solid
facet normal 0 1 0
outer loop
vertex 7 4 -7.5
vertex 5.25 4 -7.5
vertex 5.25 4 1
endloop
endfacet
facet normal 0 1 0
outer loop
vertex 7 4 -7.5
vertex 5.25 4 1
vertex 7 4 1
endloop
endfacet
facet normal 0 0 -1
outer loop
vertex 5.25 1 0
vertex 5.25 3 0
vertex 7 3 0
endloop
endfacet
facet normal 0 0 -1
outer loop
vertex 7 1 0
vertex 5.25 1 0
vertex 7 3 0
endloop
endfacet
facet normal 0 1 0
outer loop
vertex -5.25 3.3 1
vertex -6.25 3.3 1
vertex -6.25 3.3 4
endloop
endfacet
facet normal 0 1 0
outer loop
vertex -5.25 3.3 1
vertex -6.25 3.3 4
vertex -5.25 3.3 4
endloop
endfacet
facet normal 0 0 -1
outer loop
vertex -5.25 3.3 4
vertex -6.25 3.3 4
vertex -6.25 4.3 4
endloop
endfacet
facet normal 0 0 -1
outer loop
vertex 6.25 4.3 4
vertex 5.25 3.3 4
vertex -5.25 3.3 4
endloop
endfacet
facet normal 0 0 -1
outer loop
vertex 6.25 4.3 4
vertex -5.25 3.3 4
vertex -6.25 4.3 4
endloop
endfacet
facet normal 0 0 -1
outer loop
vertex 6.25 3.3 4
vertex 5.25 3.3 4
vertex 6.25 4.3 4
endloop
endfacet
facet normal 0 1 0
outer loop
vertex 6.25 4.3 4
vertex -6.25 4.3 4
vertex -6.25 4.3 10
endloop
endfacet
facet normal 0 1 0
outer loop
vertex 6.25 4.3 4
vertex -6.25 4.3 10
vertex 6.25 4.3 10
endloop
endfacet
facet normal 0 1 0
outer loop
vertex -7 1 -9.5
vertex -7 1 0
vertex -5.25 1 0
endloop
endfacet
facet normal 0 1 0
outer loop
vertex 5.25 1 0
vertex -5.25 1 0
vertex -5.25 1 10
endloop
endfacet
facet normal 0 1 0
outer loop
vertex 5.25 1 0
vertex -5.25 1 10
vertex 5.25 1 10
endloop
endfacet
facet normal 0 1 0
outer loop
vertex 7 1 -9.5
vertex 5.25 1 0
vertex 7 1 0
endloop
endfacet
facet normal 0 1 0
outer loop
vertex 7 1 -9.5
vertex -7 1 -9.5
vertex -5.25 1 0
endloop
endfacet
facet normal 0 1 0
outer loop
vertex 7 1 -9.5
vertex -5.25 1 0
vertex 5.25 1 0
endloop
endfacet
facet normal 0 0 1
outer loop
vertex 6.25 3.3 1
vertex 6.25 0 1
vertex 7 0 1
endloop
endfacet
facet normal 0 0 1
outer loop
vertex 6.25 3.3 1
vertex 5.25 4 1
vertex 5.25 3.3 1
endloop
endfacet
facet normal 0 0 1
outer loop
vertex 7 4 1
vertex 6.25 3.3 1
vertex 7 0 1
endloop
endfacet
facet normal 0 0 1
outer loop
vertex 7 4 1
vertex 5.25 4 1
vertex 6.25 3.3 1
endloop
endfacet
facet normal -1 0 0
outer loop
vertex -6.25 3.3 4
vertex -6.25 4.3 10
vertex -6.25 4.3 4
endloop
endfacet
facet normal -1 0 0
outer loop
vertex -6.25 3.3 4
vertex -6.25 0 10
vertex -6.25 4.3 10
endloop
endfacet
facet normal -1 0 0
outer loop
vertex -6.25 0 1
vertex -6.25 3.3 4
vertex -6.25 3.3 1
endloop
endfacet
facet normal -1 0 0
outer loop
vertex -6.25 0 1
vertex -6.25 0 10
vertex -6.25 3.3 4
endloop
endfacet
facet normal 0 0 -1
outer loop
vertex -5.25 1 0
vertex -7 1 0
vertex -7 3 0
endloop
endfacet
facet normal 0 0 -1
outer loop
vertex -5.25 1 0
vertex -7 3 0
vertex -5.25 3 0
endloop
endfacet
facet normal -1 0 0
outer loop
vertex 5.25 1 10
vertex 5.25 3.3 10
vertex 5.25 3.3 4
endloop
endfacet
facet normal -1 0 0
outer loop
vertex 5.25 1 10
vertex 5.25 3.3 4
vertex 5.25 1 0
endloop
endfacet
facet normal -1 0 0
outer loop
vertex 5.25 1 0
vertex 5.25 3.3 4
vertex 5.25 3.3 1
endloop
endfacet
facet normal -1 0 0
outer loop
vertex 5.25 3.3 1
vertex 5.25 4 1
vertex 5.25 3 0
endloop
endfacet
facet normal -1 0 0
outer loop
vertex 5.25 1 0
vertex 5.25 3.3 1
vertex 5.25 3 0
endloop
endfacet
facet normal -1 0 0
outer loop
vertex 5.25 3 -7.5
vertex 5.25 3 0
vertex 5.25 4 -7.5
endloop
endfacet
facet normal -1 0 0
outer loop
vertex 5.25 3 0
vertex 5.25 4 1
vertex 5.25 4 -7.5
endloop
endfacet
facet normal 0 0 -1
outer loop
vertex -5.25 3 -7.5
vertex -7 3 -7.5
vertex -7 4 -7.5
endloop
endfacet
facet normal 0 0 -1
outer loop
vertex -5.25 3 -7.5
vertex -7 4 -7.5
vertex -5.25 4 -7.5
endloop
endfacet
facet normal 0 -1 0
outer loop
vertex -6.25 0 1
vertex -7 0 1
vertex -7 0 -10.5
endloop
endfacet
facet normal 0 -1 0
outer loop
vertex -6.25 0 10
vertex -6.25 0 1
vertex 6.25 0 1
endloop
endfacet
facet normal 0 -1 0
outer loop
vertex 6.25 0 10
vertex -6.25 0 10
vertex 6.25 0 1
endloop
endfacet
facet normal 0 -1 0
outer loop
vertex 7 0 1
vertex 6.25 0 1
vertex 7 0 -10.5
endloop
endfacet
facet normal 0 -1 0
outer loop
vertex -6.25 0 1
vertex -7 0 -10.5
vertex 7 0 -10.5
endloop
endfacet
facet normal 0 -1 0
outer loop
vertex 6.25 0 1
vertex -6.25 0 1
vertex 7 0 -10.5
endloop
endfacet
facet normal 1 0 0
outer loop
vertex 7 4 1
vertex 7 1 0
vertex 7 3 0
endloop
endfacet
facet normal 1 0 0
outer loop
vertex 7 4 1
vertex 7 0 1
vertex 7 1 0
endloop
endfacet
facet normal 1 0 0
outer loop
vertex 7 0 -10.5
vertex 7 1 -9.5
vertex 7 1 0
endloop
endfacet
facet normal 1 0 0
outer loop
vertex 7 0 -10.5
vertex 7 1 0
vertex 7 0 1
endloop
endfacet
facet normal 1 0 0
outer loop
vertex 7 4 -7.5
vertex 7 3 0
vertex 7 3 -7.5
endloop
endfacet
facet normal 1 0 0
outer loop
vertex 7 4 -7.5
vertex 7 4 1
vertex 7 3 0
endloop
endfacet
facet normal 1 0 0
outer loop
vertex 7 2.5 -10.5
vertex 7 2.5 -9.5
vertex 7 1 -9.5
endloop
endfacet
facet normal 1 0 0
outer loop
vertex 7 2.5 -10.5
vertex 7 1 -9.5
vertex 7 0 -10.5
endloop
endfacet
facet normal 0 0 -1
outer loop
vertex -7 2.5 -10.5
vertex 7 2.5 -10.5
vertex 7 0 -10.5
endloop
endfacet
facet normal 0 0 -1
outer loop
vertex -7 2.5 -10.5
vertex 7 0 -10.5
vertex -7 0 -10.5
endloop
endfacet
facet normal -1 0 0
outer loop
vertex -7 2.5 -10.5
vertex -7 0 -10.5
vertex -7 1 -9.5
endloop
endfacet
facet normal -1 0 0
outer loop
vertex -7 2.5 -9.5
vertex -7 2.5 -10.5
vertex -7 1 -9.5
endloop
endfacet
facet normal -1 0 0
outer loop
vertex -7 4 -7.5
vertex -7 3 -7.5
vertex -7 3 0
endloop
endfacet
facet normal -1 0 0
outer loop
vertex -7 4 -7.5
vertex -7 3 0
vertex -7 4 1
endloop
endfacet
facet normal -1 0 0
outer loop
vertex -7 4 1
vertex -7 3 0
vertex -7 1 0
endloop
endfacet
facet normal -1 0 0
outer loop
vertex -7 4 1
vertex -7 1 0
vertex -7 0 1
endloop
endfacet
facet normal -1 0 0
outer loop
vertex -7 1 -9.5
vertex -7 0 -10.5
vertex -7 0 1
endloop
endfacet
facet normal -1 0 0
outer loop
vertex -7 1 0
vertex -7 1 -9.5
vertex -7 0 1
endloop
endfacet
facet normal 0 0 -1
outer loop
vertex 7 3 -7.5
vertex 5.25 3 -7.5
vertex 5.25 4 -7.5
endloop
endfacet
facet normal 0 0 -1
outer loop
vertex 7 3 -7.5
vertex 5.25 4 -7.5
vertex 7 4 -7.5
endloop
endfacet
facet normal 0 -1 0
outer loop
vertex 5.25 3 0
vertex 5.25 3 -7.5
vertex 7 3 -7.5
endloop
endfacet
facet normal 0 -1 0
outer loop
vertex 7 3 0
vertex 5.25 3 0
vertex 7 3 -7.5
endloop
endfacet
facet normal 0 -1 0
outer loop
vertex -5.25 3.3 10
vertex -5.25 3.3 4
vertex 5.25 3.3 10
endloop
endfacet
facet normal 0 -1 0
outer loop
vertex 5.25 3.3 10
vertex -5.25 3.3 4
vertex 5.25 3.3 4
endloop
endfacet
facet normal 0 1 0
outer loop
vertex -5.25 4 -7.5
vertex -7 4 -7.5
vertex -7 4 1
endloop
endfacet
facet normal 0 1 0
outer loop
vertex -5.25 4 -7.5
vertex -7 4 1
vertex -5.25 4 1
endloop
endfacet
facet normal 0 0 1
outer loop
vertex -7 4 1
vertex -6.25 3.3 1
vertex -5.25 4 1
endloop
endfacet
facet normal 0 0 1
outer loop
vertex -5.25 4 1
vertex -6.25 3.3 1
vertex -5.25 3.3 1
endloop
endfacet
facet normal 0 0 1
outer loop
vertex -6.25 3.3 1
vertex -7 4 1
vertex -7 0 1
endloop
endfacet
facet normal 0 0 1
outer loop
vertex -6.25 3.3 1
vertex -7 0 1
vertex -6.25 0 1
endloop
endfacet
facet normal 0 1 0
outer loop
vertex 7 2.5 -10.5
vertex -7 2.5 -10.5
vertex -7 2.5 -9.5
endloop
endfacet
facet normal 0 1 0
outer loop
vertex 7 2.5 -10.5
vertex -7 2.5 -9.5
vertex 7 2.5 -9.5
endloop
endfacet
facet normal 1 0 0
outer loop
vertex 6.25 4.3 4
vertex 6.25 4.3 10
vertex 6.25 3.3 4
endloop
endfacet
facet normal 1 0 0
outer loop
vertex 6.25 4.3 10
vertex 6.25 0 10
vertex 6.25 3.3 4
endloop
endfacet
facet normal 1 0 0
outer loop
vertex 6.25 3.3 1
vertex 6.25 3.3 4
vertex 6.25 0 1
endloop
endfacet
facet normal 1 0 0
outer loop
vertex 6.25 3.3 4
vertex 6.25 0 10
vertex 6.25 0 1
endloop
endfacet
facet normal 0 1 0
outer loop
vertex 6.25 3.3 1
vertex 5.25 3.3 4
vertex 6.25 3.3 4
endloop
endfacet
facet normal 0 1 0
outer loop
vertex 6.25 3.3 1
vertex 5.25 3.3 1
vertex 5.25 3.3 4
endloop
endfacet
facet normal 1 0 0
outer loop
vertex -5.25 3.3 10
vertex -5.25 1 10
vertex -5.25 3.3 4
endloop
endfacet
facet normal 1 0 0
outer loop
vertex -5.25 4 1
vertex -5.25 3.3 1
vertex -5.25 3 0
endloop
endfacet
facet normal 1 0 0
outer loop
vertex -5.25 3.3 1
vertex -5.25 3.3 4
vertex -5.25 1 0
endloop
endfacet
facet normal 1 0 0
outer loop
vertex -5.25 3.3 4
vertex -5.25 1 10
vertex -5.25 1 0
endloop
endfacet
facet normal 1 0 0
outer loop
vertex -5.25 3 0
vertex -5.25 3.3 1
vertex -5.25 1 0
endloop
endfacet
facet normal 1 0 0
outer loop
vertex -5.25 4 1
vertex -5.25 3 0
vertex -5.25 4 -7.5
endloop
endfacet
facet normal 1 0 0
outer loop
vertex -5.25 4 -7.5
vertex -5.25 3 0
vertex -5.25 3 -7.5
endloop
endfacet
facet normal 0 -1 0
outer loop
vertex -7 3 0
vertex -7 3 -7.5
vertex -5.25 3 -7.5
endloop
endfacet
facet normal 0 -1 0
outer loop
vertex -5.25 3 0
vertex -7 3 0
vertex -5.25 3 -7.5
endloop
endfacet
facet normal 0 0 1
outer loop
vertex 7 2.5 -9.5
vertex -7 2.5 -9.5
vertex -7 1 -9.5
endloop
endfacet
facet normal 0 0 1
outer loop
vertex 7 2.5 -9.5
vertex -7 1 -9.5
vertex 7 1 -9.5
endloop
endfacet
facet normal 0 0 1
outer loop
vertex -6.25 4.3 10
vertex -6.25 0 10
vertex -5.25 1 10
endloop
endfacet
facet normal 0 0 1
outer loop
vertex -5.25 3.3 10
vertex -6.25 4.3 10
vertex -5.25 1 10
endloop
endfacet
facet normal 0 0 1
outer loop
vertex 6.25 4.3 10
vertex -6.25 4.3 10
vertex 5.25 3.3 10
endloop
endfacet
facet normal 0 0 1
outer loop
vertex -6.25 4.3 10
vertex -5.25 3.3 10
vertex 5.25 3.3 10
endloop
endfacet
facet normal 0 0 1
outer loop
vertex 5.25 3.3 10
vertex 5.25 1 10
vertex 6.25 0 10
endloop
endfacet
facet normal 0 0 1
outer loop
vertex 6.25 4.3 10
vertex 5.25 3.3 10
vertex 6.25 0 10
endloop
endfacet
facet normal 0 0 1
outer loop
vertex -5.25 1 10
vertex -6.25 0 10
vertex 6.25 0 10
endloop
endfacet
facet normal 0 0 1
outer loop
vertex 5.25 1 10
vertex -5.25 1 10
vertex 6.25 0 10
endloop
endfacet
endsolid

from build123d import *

# Parameters (mm, degrees)
SKETCH_2_W           = 12
SKETCH_2_H           = 9.5
SKETCH_2_W_2         = 10.5
SKETCH_2_H_2         = 9
EXTRUDE_1_DEPTH      = 1
EXTRUDE_2_DEPTH      = 2.3
EXTRUDE_2_DEPTH_BACK = 1
SKETCH_4_W           = 1
SKETCH_4_H           = 9.5
SKETCH_4_W_2         = 10.5
SKETCH_4_H_2         = 1
CUT_EXTRUDE_1_DEPTH  = 2.3
SKETCH_5_W           = 12.5
SKETCH_5_H           = 6
EXTRUDE_3_DEPTH      = 1
SKETCH_6_W           = 1.75
SKETCH_6_H           = 1
CUT_EXTRUDE_3_DEPTH  = 0.3
SKETCH_9_W           = 14
SKETCH_9_H           = 1
CUT_EXTRUDE_4_DEPTH  = 0.8
SKETCH_10_W          = 1.75
SKETCH_10_H          = 7.5
SKETCH_10_H_2        = 8.5
EXTRUDE_7_DEPTH      = 1


with BuildPart() as part:
    # 草图2 → 凸台-拉伸1 (new body)
    with BuildSketch(Plane(origin=(0, 0, 0), x_dir=(1, 0, 0), z_dir=(0, 1, 0))):
        with Locations((0, 4.75)):
            Rectangle(SKETCH_2_W, SKETCH_2_H)
        with Locations((0, -4.5)):
            Rectangle(SKETCH_2_W_2, SKETCH_2_H_2)
    extrude(amount=EXTRUDE_1_DEPTH)

    # 草图3 → 凸台-拉伸2 (add, two sides)
    with BuildSketch(Plane(origin=(0, 1, 0), x_dir=(1, 0, 0), z_dir=(0, 1, 0))) as extrude_2_sk:
        Polygon((7, -1), (7, 10.5), (-7, 10.5), (-7, -1), (-6.25, -1), (-6.25, -10), (6.25, -10), (6.25, -1), align=None)
        Polygon((6, 0), (6, 9.5), (-6, 9.5), (-6, 0), (-5.25, 0), (-5.25, -9), (5.25, -9), (5.25, 0), align=None, mode=Mode.SUBTRACT)
    extrude(amount=EXTRUDE_2_DEPTH)
    extrude(extrude_2_sk.sketch, amount=-EXTRUDE_2_DEPTH_BACK)

    # 草图4 → 切除-拉伸1 (cut)
    with BuildSketch(Plane(origin=(0, 3.3, 0), x_dir=(1, 0, 0), z_dir=(0, 1, 0))):
        with Locations((-6.5, 4.75)):
            Rectangle(SKETCH_4_W, SKETCH_4_H)
        with Locations((6.5, 4.75)):
            Rectangle(SKETCH_4_W, SKETCH_4_H)
        with Locations((0, -9.5)):
            Rectangle(SKETCH_4_W_2, SKETCH_4_H_2)
    extrude(amount=-CUT_EXTRUDE_1_DEPTH, mode=Mode.SUBTRACT)

    # 草图5 → 凸台-拉伸3 (add)
    with BuildSketch(Plane(origin=(0, 3.3, 0), x_dir=(1, 0, 0), z_dir=(0, 1, 0))):
        with Locations((0, -7)):
            Rectangle(SKETCH_5_W, SKETCH_5_H)
    extrude(amount=EXTRUDE_3_DEPTH)

    # 草图6 → 切除-拉伸3 (cut)
    with BuildSketch(Plane(origin=(0, 3.3, 0), x_dir=(1, 0, 0), z_dir=(0, 1, 0))):
        with Locations((-6.125, -0.5)):
            Rectangle(SKETCH_6_W, SKETCH_6_H)
        with Locations((6.125, -0.5)):
            Rectangle(SKETCH_6_W, SKETCH_6_H)
    extrude(amount=-CUT_EXTRUDE_3_DEPTH, mode=Mode.SUBTRACT)

    # 草图9 → 切除-拉伸4 (cut)
    with BuildSketch(Plane(origin=(0, 3.3, 0), x_dir=(1, 0, 0), z_dir=(0, 1, 0))):
        with Locations((0, 10)):
            Rectangle(SKETCH_9_W, SKETCH_9_H)
    extrude(amount=-CUT_EXTRUDE_4_DEPTH, mode=Mode.SUBTRACT)

    # 草图10 → 凸台-拉伸7 (add)
    with BuildSketch(Plane(origin=(0, 3, 0), x_dir=(1, 0, 0), z_dir=(0, 1, 0))):
        with Locations((-6.125, 3.75)):
            Rectangle(SKETCH_10_W, SKETCH_10_H)
        with Locations((6.125, 3.25)):
            Rectangle(SKETCH_10_W, SKETCH_10_H_2)
        Polygon((-5.25, 0), (-7, 0), (-7, -1), (-6.25, -1), (-5.25, -1), align=None)
    extrude(amount=EXTRUDE_7_DEPTH)


solid = part.part
